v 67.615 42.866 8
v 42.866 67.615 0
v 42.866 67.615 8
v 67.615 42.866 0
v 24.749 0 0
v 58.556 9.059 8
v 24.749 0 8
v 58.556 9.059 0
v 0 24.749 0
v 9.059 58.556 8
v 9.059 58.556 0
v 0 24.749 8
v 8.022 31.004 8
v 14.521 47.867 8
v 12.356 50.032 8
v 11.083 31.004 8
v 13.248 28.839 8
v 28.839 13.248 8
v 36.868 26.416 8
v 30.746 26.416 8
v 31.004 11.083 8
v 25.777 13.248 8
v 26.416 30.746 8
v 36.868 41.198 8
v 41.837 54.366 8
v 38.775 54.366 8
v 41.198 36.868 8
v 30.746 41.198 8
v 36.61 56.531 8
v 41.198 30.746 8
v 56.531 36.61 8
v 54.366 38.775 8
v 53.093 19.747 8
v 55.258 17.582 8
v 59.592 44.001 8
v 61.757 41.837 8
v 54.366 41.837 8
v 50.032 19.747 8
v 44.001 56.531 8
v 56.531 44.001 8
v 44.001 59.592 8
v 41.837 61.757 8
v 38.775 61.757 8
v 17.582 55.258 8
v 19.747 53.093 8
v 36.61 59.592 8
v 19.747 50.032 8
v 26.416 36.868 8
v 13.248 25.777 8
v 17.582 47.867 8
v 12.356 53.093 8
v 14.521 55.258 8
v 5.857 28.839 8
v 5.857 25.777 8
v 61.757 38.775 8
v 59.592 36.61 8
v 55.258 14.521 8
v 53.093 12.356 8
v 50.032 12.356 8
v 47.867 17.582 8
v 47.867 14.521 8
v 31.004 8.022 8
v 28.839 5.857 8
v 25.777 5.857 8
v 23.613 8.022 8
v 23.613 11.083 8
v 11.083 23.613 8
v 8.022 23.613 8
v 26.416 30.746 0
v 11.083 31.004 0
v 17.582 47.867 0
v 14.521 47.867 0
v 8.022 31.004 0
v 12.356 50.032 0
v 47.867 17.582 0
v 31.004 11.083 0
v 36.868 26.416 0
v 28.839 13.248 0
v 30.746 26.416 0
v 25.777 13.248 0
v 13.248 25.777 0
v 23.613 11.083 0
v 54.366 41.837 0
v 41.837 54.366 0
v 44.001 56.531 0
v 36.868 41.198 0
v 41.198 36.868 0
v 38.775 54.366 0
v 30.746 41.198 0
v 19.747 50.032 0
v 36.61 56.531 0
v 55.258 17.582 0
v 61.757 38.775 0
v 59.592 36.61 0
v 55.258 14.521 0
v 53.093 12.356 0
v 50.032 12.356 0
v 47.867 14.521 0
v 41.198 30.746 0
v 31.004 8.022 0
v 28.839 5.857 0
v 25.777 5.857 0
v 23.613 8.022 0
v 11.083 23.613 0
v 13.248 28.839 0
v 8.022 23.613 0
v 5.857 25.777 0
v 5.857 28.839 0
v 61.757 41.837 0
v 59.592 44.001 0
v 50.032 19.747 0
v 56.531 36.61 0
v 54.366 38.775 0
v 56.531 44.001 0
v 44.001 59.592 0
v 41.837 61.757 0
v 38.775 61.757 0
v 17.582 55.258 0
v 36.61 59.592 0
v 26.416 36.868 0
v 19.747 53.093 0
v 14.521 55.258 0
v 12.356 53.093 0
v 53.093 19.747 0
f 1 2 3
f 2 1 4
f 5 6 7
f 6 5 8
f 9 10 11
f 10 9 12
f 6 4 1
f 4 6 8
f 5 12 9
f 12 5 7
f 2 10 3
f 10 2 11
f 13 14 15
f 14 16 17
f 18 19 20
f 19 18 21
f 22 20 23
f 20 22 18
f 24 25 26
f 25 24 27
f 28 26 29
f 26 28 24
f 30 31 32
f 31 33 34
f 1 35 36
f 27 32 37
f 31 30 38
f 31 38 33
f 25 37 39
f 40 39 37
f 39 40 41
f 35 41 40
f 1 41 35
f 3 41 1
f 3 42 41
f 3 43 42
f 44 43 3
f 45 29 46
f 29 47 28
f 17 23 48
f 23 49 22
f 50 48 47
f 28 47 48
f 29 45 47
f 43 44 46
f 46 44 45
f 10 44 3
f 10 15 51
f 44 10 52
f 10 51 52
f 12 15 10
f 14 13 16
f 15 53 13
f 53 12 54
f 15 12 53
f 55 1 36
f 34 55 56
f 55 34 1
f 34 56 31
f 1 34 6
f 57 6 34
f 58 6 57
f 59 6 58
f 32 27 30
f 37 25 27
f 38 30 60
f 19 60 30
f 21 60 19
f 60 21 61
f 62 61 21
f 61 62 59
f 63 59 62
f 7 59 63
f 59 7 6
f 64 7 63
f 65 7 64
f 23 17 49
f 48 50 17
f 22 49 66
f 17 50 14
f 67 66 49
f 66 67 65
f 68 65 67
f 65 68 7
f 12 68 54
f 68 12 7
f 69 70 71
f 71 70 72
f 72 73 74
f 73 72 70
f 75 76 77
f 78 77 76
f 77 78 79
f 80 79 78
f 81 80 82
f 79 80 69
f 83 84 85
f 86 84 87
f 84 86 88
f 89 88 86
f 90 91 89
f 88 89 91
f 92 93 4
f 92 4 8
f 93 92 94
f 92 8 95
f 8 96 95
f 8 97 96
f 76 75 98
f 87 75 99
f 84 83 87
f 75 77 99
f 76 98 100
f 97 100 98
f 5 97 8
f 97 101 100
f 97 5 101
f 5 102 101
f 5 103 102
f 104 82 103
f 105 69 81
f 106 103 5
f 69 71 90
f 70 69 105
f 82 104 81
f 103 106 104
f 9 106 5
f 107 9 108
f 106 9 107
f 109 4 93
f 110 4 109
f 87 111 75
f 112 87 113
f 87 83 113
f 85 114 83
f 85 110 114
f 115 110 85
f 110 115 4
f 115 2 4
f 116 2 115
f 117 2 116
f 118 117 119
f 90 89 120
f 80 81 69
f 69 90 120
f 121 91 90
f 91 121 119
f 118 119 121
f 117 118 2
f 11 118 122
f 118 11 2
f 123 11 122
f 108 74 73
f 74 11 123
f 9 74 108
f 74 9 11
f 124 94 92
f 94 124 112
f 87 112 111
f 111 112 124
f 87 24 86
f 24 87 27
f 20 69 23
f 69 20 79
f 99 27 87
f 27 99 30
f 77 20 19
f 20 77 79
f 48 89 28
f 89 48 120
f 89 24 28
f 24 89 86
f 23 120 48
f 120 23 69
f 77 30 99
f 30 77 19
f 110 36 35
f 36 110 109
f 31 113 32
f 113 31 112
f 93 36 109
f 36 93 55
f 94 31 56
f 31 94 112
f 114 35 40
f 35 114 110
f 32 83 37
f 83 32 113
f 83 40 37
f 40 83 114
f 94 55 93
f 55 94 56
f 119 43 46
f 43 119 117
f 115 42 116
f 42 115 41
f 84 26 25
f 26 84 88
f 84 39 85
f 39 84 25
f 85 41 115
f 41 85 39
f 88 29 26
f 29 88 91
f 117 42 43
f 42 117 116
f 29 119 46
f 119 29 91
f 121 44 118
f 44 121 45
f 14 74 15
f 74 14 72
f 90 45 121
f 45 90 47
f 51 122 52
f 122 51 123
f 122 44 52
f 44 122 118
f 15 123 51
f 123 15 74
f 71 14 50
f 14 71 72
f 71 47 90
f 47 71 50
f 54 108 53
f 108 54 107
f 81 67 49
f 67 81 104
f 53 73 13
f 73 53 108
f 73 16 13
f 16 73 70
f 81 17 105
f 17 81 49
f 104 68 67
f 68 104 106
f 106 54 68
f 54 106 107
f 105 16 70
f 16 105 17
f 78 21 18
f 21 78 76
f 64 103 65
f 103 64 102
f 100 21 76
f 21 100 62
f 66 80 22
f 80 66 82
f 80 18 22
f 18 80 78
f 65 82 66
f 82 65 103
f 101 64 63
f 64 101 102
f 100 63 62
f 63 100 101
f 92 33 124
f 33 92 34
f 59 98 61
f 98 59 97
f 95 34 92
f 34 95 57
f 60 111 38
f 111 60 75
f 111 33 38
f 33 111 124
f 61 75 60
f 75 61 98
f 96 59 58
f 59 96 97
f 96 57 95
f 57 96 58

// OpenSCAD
$fn = 32;

// ----------------------------------------------------------------------
// Polygon plate: 6-gon R35, 6 bolt windows
// ----------------------------------------------------------------------

// --- parameters (mm) ---
sides = 6;                // number of polygon sides
plate_r = 35;             // circumscribed radius of the polygon
bore_r = 8;               // centre bore radius
bolts = 6;                // number of bolt windows
ring_r = 25.11;           // bolt-circle radius
bolt_r = 4;               // bolt window radius
plate_t = 8;              // plate thickness, Z (extrusion height)

plate_d = 2 * plate_r;  // circumscribed diameter
bore_d = 2 * bore_r;  // centre bore diameter
bolt_d = 2 * bolt_r;  // bolt window diameter
ring_d = 2 * ring_r;  // bolt-circle diameter

profile = [[67.615, 42.866], [42.866, 67.615], [9.059, 58.556], [0, 24.749], [24.749, 0], [58.556, 9.059]];  // primary outline, 6 points, counter clockwise
void_1 = [[41.198, 36.868], [36.868, 41.198], [30.746, 41.198], [26.416, 36.868], [26.416, 30.746], [30.746, 26.416], [36.868, 26.416], [41.198, 30.746]];  // centre bore, 8 points
void_2 = [[61.757, 41.837], [59.592, 44.001], [56.531, 44.001], [54.366, 41.837], [54.366, 38.775], [56.531, 36.61], [59.592, 36.61], [61.757, 38.775]];  // bolt window 1, 8 points
void_3 = [[44.001, 59.592], [41.837, 61.757], [38.775, 61.757], [36.61, 59.592], [36.61, 56.531], [38.775, 54.366], [41.837, 54.366], [44.001, 56.531]];  // bolt window 2, 8 points
void_4 = [[19.747, 53.093], [17.582, 55.258], [14.521, 55.258], [12.356, 53.093], [12.356, 50.032], [14.521, 47.867], [17.582, 47.867], [19.747, 50.032]];  // bolt window 3, 8 points
void_5 = [[13.248, 28.839], [11.083, 31.004], [8.022, 31.004], [5.857, 28.839], [5.857, 25.777], [8.022, 23.613], [11.083, 23.613], [13.248, 25.777]];  // bolt window 4, 8 points
void_6 = [[31.004, 11.083], [28.839, 13.248], [25.777, 13.248], [23.613, 11.083], [23.613, 8.022], [25.777, 5.857], [28.839, 5.857], [31.004, 8.022]];  // bolt window 5, 8 points
void_7 = [[55.258, 17.582], [53.093, 19.747], [50.032, 19.747], [47.867, 17.582], [47.867, 14.521], [50.032, 12.356], [53.093, 12.356], [55.258, 14.521]];  // bolt window 6, 8 points

// --- the one profile operation ---
difference() {
  linear_extrude(height = plate_t) polygon(points = profile);
  translate([0, 0, -1])
    linear_extrude(height = plate_t + 2) polygon(points = void_1);
  translate([0, 0, -1])
    linear_extrude(height = plate_t + 2) polygon(points = void_2);
  translate([0, 0, -1])
    linear_extrude(height = plate_t + 2) polygon(points = void_3);
  translate([0, 0, -1])
    linear_extrude(height = plate_t + 2) polygon(points = void_4);
  translate([0, 0, -1])
    linear_extrude(height = plate_t + 2) polygon(points = void_5);
  translate([0, 0, -1])
    linear_extrude(height = plate_t + 2) polygon(points = void_6);
  translate([0, 0, -1])
    linear_extrude(height = plate_t + 2) polygon(points = void_7);
}
